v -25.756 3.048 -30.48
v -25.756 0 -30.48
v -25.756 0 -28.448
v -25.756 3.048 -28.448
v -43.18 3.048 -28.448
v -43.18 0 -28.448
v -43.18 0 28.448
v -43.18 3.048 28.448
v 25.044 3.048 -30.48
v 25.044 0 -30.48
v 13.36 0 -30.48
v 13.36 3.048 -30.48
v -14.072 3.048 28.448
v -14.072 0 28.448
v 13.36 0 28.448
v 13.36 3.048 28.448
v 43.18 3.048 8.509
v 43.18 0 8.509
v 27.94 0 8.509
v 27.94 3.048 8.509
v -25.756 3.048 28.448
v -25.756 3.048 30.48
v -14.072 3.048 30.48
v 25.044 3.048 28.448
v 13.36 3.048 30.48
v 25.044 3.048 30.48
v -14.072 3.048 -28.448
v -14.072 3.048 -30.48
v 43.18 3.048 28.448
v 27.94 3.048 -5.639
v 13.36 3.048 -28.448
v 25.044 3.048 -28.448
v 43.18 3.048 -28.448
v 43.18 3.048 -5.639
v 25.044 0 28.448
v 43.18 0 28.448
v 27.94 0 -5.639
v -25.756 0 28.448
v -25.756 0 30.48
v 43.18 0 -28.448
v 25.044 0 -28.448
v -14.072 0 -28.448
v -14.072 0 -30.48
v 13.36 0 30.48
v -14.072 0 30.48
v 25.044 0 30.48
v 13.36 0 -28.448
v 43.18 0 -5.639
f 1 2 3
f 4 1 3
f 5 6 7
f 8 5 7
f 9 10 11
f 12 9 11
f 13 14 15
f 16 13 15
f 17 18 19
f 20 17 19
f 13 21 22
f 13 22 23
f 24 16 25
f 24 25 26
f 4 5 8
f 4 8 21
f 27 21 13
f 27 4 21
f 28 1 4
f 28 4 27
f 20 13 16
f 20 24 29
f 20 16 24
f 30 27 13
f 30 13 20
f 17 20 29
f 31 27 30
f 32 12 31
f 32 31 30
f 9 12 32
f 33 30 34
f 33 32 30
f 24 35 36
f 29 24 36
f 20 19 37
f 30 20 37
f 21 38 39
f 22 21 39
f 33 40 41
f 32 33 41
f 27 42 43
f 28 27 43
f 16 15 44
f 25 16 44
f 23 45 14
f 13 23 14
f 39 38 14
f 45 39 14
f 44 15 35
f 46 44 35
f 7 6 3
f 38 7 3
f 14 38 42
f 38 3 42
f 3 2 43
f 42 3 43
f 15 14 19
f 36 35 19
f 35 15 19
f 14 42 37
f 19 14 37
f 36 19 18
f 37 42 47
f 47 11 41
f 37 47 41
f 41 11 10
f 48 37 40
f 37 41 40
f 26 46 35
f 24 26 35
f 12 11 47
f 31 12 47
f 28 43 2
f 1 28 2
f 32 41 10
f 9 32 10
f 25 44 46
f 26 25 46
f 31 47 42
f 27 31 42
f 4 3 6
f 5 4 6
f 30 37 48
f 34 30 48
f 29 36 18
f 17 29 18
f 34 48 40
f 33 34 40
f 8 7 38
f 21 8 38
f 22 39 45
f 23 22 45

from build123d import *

# Parameters (mm, degrees)
BOSS_EXTRUDE1_DEPTH = 3.048


with BuildPart() as part:
    # Sketch1 → Boss-Extrude1 (new body)
    with BuildSketch(Plane(origin=(0, 0, 0), x_dir=(1, 0, 0), z_dir=(0, 1, 0))):
        Polygon((-25.7556, -28.448), (-25.7556, -30.48), (-14.0716, -30.48), (-14.0716, -28.448), (13.3604, -28.448), (13.3604, -30.48), (25.0444, -30.48), (25.0444, -28.448), (43.18, -28.448), (43.18, -8.509), (27.94, -8.509), (27.94, 5.6388), (43.18, 5.6388), (43.18, 28.448), (25.0444, 28.448), (25.0444, 30.48), (13.3604, 30.48), (13.3604, 28.448), (-14.0716, 28.448), (-14.0716, 30.48), (-25.7556, 30.48), (-25.7556, 28.448), (-43.18, 28.448), (-43.18, -28.448), align=None)
    extrude(amount=BOSS_EXTRUDE1_DEPTH)


solid = part.part
